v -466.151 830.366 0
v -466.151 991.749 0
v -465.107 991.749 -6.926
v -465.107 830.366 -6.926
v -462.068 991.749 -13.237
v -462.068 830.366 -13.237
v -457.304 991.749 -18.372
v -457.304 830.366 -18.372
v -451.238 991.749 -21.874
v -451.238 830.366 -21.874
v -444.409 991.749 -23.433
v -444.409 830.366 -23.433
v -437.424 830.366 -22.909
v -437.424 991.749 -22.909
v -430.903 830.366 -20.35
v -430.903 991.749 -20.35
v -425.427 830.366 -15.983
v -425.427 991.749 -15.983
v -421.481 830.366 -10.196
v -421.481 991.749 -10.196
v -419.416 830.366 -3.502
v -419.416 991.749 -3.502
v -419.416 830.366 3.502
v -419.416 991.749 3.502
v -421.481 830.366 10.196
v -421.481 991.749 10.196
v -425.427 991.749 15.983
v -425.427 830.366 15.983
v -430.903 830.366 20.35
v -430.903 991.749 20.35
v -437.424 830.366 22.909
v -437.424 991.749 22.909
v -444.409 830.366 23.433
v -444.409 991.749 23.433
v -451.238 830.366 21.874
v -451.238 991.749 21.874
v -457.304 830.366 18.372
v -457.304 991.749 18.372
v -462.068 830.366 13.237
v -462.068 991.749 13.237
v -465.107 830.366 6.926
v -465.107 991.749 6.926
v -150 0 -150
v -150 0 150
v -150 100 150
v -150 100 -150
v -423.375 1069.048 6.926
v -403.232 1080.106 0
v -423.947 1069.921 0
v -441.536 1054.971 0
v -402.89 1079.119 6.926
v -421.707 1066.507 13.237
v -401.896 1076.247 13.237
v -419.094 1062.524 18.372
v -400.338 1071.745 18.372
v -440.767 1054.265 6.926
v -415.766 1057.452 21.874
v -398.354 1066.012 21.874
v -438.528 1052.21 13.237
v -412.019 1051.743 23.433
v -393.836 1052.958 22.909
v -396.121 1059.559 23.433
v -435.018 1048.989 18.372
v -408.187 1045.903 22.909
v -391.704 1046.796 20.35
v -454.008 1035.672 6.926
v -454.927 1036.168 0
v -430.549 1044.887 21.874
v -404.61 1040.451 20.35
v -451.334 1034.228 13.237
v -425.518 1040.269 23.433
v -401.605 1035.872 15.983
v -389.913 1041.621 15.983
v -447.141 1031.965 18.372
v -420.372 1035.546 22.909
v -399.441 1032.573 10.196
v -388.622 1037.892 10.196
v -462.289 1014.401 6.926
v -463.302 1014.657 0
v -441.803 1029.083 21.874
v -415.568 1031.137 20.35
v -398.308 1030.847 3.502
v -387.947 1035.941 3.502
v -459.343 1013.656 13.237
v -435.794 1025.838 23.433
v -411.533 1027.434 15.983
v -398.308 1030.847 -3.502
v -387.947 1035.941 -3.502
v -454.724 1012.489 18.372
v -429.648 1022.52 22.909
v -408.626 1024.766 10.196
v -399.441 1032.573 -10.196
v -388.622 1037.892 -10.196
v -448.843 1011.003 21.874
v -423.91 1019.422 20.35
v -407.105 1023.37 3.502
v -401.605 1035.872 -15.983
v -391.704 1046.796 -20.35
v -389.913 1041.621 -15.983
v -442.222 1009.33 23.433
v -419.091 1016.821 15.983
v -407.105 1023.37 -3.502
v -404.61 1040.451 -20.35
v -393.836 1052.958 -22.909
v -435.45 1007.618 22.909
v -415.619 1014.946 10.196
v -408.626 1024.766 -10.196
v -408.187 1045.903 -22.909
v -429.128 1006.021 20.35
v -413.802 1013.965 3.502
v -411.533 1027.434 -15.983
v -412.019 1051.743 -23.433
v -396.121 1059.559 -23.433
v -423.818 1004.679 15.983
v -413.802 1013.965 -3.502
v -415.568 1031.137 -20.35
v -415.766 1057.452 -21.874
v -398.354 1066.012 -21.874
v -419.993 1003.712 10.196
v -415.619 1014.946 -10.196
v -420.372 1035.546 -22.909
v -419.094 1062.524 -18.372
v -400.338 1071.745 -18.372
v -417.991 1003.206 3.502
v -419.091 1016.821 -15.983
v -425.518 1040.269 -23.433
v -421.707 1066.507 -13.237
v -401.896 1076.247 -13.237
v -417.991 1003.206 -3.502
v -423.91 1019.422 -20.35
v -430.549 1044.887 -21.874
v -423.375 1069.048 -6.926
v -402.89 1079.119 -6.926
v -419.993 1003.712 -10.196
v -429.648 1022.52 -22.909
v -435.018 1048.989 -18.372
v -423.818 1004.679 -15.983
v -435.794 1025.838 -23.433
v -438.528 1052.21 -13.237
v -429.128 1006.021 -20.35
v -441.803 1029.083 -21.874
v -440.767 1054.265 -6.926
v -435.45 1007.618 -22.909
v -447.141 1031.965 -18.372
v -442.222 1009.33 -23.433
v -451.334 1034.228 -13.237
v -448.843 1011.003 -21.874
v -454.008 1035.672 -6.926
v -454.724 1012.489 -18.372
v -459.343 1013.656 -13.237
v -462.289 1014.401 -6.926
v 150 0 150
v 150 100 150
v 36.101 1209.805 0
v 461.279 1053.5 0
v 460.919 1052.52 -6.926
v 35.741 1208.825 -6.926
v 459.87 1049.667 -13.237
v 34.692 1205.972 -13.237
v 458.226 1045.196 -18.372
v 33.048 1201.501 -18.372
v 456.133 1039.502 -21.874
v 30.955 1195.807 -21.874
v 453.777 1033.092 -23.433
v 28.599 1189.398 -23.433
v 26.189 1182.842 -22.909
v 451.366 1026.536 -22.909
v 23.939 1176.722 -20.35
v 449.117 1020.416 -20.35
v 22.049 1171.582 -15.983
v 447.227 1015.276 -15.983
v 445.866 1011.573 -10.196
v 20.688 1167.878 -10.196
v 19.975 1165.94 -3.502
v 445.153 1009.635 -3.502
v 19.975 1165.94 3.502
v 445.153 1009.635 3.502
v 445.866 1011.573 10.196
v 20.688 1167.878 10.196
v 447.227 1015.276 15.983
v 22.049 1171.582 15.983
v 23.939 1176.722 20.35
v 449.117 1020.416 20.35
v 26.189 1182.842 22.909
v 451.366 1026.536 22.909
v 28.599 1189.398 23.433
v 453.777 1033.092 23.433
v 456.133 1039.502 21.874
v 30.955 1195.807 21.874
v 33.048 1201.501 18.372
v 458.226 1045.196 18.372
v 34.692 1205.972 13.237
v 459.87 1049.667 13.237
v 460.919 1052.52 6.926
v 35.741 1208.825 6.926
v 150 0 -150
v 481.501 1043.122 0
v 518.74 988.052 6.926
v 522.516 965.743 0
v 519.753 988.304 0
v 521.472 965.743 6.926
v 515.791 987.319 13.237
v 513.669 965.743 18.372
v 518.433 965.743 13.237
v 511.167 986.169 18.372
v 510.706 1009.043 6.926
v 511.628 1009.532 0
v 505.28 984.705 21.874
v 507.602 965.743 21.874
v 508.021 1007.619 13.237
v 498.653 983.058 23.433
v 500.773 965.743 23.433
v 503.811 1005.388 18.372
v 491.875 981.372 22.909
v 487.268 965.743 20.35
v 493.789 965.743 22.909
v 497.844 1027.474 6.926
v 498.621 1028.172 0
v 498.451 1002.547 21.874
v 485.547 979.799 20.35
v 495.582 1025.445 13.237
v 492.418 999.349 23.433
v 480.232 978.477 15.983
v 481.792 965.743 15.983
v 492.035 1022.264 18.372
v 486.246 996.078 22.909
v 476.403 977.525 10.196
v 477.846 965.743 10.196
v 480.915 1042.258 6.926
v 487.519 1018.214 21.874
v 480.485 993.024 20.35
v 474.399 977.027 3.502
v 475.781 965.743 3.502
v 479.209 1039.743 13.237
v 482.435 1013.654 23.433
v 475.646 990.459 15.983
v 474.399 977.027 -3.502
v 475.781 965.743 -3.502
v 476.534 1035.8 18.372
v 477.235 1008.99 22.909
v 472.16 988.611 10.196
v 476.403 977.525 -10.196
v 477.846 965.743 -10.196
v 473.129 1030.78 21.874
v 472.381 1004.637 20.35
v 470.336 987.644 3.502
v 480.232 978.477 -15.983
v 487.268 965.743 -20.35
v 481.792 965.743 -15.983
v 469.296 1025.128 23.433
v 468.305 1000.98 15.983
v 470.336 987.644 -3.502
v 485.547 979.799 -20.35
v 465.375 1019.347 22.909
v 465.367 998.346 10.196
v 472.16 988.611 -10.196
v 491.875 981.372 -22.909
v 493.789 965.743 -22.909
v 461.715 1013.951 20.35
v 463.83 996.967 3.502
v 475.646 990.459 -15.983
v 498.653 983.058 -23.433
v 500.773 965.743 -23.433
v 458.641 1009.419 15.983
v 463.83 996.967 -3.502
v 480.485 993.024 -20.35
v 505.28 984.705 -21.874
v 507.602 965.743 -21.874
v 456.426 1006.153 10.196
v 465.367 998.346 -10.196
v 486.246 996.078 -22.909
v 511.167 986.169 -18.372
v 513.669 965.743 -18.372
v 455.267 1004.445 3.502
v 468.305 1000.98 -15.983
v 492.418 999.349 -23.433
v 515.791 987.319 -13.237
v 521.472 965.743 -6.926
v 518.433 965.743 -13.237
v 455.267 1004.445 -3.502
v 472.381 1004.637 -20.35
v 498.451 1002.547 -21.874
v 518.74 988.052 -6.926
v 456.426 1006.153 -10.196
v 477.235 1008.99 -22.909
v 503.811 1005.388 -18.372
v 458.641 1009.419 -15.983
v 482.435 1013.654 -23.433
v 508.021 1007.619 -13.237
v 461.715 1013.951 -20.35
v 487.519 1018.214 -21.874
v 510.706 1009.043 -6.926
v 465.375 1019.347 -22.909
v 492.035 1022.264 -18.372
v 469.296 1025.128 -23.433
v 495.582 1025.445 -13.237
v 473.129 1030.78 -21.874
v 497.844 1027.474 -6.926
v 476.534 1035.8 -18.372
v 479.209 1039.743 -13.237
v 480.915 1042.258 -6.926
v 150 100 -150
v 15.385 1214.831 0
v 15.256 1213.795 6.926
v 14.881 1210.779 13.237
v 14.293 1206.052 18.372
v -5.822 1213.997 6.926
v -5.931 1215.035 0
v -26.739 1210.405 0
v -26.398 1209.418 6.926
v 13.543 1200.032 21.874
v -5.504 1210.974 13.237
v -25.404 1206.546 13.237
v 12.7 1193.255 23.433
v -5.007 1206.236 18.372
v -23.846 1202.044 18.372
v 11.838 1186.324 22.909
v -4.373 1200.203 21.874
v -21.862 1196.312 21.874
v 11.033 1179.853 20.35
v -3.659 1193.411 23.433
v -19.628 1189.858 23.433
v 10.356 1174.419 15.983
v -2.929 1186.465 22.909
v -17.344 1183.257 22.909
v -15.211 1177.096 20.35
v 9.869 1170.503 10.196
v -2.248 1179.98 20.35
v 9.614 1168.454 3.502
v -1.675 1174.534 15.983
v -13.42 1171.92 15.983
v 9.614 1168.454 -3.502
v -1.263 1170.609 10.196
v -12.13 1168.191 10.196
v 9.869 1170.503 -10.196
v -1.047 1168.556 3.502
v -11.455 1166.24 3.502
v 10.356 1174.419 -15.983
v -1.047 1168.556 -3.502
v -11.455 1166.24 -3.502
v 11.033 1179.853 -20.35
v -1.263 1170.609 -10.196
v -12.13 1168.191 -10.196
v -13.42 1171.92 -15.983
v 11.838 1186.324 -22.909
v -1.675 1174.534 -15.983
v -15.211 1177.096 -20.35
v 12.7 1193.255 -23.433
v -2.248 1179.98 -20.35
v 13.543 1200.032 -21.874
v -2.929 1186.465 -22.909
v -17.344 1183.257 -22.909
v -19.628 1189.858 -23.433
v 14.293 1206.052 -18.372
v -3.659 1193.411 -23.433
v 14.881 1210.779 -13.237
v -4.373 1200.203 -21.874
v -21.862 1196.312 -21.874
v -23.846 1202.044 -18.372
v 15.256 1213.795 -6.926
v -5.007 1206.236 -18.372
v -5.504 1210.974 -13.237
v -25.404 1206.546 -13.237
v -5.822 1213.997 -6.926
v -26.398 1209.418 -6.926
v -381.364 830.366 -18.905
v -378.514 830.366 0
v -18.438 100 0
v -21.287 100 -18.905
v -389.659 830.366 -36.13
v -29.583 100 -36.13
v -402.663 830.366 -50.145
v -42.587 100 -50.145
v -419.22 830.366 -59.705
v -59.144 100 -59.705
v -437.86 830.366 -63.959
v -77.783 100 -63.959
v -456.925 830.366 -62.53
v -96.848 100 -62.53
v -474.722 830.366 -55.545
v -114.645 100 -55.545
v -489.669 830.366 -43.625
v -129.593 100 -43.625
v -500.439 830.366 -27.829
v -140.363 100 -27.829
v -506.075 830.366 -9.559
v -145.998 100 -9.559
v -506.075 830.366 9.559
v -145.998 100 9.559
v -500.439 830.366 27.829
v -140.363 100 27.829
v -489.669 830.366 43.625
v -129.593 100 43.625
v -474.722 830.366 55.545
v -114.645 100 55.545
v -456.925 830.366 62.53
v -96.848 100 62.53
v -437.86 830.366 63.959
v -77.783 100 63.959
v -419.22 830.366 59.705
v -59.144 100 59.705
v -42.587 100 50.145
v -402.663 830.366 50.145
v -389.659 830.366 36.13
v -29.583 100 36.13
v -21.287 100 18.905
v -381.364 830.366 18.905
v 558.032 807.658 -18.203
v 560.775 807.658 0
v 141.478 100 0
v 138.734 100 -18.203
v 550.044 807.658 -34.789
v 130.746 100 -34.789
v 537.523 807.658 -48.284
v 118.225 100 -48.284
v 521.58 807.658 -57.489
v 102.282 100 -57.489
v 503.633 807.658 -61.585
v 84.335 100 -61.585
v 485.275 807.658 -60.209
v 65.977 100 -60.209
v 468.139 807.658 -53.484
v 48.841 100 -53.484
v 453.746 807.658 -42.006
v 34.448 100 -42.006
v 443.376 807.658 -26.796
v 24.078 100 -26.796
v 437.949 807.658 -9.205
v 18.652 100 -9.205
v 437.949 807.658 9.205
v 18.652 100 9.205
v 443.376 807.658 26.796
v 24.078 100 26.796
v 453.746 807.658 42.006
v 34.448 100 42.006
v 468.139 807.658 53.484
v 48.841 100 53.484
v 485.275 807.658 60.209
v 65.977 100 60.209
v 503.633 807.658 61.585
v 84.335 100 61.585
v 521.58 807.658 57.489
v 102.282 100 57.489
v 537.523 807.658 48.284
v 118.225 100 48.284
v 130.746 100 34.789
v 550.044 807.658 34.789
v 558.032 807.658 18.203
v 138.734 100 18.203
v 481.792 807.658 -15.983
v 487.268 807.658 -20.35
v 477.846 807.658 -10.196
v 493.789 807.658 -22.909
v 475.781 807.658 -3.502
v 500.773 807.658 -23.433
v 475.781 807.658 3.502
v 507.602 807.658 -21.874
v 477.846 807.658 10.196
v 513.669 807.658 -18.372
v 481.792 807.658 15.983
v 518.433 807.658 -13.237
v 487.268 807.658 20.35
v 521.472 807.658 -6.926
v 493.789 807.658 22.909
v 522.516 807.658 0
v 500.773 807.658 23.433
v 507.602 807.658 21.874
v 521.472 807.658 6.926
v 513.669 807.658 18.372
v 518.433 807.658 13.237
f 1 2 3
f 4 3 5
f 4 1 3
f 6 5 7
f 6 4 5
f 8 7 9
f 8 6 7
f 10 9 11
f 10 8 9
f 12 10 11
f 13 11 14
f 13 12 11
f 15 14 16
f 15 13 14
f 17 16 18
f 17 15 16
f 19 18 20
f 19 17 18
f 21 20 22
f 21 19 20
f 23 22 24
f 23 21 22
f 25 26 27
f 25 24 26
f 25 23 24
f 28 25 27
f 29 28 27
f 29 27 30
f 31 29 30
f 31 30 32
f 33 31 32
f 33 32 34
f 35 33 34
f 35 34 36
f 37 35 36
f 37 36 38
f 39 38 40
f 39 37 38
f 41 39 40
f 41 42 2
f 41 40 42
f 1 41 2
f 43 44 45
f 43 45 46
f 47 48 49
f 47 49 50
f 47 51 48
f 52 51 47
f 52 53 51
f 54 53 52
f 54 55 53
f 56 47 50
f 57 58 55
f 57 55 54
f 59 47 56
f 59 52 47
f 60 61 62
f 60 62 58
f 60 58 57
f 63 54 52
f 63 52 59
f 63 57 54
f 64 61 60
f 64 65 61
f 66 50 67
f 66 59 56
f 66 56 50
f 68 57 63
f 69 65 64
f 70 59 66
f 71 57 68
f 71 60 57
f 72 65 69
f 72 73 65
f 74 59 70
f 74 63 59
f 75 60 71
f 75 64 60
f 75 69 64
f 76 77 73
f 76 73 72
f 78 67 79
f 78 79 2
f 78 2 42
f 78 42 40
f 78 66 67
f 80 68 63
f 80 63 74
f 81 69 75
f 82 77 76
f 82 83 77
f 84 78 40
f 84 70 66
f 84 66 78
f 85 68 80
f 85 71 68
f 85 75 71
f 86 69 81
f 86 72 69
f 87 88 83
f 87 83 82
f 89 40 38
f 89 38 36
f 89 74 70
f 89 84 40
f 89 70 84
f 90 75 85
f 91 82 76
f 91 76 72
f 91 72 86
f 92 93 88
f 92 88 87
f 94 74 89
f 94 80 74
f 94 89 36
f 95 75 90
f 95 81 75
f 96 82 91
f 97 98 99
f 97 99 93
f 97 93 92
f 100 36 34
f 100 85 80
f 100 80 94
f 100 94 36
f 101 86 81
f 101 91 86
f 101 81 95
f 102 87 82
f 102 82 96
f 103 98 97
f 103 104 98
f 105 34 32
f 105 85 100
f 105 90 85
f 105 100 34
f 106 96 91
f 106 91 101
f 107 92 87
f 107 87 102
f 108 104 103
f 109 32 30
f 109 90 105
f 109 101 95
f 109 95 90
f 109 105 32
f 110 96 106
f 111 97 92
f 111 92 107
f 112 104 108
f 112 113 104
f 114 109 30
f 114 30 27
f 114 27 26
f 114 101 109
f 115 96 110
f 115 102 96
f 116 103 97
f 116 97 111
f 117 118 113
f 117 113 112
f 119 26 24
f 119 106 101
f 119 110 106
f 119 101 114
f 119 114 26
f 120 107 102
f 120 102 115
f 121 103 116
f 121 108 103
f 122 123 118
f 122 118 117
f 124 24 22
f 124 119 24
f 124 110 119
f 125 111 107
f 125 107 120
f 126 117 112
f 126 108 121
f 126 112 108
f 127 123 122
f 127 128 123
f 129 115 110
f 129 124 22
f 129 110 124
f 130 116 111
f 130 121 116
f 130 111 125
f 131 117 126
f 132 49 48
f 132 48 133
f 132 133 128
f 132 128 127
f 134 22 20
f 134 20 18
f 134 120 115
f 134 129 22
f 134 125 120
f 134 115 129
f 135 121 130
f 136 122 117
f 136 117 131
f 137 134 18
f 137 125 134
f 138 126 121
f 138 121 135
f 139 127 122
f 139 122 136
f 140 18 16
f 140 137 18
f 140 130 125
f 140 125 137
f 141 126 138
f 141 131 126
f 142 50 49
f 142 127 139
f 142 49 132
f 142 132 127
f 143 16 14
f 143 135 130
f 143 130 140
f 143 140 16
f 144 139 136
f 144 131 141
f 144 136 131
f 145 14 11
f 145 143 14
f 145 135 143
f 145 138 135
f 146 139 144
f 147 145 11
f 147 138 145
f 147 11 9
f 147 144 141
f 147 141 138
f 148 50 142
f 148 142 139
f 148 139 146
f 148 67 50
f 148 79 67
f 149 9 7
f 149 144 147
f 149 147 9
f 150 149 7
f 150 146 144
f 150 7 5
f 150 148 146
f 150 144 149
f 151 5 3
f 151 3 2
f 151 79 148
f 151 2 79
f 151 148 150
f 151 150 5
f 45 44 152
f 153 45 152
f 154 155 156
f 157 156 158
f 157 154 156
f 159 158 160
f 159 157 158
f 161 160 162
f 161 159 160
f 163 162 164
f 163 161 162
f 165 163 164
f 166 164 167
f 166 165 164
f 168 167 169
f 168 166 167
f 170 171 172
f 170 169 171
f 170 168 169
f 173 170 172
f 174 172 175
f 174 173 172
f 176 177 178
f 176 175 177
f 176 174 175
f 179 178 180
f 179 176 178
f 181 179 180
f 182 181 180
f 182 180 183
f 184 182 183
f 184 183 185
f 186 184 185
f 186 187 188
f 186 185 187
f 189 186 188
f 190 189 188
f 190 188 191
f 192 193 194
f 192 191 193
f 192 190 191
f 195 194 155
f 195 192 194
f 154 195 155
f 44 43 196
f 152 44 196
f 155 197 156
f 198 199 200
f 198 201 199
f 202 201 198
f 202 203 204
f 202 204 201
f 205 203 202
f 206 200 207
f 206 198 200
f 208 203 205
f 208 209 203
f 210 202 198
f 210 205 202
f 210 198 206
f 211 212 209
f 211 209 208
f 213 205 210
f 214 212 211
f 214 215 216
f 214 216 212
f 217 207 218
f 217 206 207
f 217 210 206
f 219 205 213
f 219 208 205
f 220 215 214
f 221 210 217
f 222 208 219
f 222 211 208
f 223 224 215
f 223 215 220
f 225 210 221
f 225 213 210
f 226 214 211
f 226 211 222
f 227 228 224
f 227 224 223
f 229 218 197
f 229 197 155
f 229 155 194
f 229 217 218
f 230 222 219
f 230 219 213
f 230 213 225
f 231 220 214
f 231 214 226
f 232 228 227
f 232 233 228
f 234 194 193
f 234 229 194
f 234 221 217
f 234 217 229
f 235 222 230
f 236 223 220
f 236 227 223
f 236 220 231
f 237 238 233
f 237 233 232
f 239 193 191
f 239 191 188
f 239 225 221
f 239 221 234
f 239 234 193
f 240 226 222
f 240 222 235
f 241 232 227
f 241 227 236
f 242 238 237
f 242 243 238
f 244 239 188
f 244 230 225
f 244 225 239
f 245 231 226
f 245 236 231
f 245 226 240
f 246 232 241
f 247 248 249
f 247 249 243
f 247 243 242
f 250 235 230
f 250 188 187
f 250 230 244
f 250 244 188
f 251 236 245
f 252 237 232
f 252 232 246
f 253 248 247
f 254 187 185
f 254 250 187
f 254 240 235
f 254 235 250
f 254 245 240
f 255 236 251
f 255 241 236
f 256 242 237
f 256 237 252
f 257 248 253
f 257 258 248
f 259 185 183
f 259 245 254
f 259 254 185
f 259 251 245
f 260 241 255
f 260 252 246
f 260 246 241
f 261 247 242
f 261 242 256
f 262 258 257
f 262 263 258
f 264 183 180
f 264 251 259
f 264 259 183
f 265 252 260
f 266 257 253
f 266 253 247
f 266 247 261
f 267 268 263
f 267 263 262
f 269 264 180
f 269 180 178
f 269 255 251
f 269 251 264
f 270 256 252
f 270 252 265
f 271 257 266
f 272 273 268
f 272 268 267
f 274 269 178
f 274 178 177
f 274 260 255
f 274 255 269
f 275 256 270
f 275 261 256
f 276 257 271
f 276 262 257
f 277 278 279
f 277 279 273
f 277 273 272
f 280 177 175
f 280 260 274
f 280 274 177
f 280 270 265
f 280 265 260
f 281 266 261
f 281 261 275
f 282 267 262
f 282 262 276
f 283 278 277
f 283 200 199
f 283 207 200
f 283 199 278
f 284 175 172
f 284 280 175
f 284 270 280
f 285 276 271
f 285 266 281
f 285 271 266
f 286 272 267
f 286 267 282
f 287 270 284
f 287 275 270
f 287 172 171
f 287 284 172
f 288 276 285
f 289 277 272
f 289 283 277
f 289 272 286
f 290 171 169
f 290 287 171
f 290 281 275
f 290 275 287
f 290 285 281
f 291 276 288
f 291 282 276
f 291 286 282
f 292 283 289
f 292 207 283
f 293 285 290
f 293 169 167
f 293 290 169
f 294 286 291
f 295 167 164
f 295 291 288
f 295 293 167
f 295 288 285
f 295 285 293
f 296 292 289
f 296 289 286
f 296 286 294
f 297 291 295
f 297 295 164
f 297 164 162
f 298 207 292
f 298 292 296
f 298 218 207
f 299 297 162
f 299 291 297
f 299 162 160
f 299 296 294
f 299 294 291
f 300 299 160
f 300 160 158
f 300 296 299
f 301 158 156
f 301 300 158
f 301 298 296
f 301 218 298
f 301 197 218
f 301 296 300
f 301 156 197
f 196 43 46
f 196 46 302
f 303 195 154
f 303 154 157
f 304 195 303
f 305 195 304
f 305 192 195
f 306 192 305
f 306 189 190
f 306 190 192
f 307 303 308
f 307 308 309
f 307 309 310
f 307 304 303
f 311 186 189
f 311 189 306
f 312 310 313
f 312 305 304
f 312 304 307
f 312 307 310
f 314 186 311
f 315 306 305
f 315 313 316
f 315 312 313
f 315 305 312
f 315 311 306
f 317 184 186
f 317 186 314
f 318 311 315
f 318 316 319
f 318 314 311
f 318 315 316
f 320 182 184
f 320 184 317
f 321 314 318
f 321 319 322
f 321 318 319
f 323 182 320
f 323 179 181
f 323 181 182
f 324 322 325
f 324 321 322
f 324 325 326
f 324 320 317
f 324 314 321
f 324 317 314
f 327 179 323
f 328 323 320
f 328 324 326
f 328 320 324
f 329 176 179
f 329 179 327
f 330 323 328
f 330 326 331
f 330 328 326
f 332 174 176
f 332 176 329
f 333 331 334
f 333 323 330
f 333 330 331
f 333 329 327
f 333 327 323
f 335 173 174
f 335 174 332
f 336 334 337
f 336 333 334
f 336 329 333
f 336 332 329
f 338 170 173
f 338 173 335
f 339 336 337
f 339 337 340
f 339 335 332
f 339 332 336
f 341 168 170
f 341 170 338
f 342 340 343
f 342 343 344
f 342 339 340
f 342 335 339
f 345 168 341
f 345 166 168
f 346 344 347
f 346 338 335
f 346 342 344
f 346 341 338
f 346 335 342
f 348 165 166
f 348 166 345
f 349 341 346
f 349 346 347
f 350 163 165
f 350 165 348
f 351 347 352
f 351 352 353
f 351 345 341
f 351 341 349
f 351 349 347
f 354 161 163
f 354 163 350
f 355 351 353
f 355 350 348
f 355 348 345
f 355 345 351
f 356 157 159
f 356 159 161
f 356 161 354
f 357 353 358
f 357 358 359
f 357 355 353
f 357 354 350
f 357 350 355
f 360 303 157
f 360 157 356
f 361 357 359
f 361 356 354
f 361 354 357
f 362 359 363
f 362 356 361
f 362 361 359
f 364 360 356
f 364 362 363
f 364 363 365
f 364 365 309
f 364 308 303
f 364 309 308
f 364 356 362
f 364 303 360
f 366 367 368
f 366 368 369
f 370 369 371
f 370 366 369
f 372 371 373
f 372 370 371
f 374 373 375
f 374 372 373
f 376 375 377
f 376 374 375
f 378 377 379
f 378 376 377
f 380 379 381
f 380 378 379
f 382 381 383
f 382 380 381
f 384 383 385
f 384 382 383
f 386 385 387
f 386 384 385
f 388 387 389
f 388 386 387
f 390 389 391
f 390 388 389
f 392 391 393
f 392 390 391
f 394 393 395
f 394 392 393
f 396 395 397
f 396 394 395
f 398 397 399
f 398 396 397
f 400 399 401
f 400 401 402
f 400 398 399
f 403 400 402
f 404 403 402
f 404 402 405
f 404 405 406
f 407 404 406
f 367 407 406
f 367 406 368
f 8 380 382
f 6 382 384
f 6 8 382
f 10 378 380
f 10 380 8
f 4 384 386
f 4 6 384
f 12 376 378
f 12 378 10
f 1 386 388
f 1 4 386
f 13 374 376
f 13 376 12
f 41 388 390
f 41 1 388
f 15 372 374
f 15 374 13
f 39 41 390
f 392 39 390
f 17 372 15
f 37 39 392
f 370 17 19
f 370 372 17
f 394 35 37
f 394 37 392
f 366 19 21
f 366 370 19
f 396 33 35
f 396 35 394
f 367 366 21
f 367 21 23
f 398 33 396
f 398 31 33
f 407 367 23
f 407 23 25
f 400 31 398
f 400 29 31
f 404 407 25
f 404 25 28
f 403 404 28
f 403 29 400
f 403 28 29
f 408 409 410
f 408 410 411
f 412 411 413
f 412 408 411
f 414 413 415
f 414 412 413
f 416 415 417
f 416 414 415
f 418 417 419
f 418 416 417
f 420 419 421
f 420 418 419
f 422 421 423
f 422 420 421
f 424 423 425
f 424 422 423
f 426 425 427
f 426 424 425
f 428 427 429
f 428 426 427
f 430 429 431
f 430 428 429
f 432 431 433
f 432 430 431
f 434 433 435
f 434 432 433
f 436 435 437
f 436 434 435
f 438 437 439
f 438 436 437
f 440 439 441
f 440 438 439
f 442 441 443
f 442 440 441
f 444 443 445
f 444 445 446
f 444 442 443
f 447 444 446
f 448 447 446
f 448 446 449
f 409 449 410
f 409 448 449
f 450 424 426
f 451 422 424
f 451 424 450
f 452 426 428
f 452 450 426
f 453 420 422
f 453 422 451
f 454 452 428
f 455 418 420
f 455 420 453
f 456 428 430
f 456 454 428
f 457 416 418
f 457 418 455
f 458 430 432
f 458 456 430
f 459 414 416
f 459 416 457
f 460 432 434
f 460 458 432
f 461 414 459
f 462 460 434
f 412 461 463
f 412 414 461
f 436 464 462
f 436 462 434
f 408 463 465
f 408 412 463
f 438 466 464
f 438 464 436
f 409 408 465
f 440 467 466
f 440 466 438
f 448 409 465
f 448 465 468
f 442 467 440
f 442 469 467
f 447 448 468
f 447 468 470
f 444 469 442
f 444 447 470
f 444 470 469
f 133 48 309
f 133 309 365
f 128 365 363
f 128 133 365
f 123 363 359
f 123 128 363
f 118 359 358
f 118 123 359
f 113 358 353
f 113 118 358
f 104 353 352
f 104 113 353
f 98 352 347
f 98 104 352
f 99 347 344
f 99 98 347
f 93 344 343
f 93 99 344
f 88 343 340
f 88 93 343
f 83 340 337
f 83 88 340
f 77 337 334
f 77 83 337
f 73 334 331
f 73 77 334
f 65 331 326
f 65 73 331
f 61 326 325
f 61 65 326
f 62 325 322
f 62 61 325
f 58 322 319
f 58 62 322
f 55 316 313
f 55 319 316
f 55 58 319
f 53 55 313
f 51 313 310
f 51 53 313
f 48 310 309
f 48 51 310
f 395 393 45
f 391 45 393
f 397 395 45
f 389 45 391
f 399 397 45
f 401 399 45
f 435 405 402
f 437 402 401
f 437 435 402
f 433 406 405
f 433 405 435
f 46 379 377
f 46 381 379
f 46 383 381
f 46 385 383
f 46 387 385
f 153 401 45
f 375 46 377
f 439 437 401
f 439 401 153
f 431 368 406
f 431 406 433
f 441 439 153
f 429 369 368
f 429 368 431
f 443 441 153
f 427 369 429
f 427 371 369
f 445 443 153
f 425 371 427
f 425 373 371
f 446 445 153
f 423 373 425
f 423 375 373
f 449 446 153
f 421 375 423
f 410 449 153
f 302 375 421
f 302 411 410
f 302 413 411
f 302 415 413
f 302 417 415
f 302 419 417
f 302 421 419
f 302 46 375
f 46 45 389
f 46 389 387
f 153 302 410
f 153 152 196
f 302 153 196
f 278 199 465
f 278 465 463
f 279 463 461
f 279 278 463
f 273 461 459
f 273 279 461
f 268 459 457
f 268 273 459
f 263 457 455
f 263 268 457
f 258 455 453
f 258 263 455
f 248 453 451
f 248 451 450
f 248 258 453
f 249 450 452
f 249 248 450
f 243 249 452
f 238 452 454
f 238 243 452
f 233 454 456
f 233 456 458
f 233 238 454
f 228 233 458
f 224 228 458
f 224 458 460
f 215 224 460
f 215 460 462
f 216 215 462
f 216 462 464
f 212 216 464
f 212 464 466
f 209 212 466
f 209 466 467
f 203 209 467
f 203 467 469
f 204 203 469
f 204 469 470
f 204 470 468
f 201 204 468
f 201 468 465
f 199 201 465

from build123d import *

# Parameters (mm, degrees)
CROQUIS1_W              = 300
CROQUIS1_H              = 300
SALIENTE_EXTRUIR1_DEPTH = 100
CROQUIS2_R              = 61.757793717
CROQUIS3_R              = 64.13831418
CROQUIS5_R              = 23.498626295


with BuildPart() as part:
    # Croquis1 → Saliente-Extruir1 (new body)
    with BuildSketch(Plane(origin=(0, 0, 0), x_dir=(1, 0, 0), z_dir=(0, 1, 0))):
        Rectangle(CROQUIS1_W, CROQUIS1_H)
    extrude(amount=SALIENTE_EXTRUIR1_DEPTH)

    # Barrer1: sweep along a curve in space
    with BuildLine() as barrer1_path:
        Line((79.719719639, 100, 0), (499.017442554, 807.657749643, 0))
    # Croquis2 → Barrer1 (sweep)
    with BuildSketch(Plane(origin=(0, 100, 0), x_dir=(1, 0, 0), z_dir=(0, 1, 0))):
        with Locations((79.719719639, 0)):
            Circle(CROQUIS2_R)
    sweep(path=barrer1_path.line)

    # Barrer2: sweep along a curve in space
    with BuildLine() as barrer2_path:
        Line((-82.576305282, 100, 0), (-442.652634805, 830.366298789, 0))
    # Croquis3 → Barrer2 (sweep)
    with BuildSketch(Plane(origin=(0, 100, 0), x_dir=(1, 0, 0), z_dir=(0, 1, 0))):
        with Locations((-82.576305282, 0)):
            Circle(CROQUIS3_R)
    sweep(path=barrer2_path.line)

    # Barrer4: sweep along a curve in space
    with BuildLine() as barrer4_path:
        Line((499.017442554, 807.657749643, 0), (499.017442554, 965.743179521, 0))
        ThreePointArc((499.017442554, 965.743179521, 0), (486.422687881, 1005.801110184, 0), (453.170648011, 1031.444189149, 0))
        Line((453.170648011, 1031.444189149, 0), (27.99293329, 1187.749316841, 0))
        ThreePointArc((27.99293329, 1187.749316841, 0), (4.508322897, 1192.045114145, 0), (-19.05406022, 1188.19870002, 0))
        Line((-395.546422858, 1057.899604458, 0), (-19.05406022, 1188.19870002, 0))
        ThreePointArc((-442.652634805, 991.749211651, 0), (-429.672653938, 1032.353613113, 0), (-395.546422858, 1057.899604458, 0))
        Line((-442.652634805, 830.366298789, 0), (-442.652634805, 991.749211651, 0))
    # Croquis5 → Barrer4 (sweep)
    with BuildSketch(Plane(origin=(0, 807.657749643, 0), x_dir=(1, 0, 0), z_dir=(0, 1, 0))):
        with Locations((499.017442554, 0)):
            Circle(CROQUIS5_R)
    sweep(path=barrer4_path.line)


solid = part.part
